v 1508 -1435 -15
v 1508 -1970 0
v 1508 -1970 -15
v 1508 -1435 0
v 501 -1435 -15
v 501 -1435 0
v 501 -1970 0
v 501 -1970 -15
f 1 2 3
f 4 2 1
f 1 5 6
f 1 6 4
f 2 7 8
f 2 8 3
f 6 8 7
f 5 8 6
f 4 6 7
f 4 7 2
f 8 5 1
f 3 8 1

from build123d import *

# Parameters (mm, degrees)
IZIM1_W                    = 1508
IZIM1_H                    = 1970
TABAN_FLAN_1_DEPTH         = 15
KES_EKSTR_ZYON1_DEPTH      = 2481.965336316
KES_EKSTR_ZYON1_DEPTH_BACK = 2481.965336316
IZIM2_W                    = 501
IZIM2_H                    = 1970
KES_EKSTR_ZYON2_DEPTH      = 2481.965336316
KES_EKSTR_ZYON2_DEPTH_BACK = 2481.965336316
IZIM3_W                    = 1007
IZIM3_H                    = 310
KES_EKSTR_ZYON3_DEPTH      = 2481.965336316
KES_EKSTR_ZYON3_DEPTH_BACK = 2481.965336316
IZIM4_W                    = 1007
IZIM4_H                    = 1125


# Sheet-metal steps are written as plain solids
with BuildPart() as part:
    # Çizim1 → Taban-Flanş1 (new body)
    with BuildSketch(Plane.XY):
        with Locations((754, -985)):
            Rectangle(IZIM1_W, IZIM1_H)
    extrude(amount=-TABAN_FLAN_1_DEPTH)

    # Çizim2 → Kes-Ekstrüzyon1 (cut, two sides: drawn at the far end of the back side and taken through both)
    with BuildSketch(Plane.XY.offset(-KES_EKSTR_ZYON1_DEPTH_BACK)):
        with Locations((250.5, -985)):
            Rectangle(IZIM2_W, IZIM2_H)
    extrude(amount=KES_EKSTR_ZYON1_DEPTH + KES_EKSTR_ZYON1_DEPTH_BACK, mode=Mode.SUBTRACT)

    # Çizim3 → Kes-Ekstrüzyon2 (cut, two sides: drawn at the far end of the back side and taken through both)
    with BuildSketch(Plane.XY.offset(-KES_EKSTR_ZYON2_DEPTH_BACK)):
        with Locations((1004.5, -155)):
            Rectangle(IZIM3_W, IZIM3_H)
    extrude(amount=KES_EKSTR_ZYON2_DEPTH + KES_EKSTR_ZYON2_DEPTH_BACK, mode=Mode.SUBTRACT)

    # Çizim4 → Kes-Ekstrüzyon3 (cut, two sides: drawn at the far end of the back side and taken through both)
    with BuildSketch(Plane.XY.offset(-KES_EKSTR_ZYON3_DEPTH_BACK)):
        with Locations((1004.5, -872.5)):
            Rectangle(IZIM4_W, IZIM4_H)
    extrude(amount=KES_EKSTR_ZYON3_DEPTH + KES_EKSTR_ZYON3_DEPTH_BACK, mode=Mode.SUBTRACT)


solid = part.part
